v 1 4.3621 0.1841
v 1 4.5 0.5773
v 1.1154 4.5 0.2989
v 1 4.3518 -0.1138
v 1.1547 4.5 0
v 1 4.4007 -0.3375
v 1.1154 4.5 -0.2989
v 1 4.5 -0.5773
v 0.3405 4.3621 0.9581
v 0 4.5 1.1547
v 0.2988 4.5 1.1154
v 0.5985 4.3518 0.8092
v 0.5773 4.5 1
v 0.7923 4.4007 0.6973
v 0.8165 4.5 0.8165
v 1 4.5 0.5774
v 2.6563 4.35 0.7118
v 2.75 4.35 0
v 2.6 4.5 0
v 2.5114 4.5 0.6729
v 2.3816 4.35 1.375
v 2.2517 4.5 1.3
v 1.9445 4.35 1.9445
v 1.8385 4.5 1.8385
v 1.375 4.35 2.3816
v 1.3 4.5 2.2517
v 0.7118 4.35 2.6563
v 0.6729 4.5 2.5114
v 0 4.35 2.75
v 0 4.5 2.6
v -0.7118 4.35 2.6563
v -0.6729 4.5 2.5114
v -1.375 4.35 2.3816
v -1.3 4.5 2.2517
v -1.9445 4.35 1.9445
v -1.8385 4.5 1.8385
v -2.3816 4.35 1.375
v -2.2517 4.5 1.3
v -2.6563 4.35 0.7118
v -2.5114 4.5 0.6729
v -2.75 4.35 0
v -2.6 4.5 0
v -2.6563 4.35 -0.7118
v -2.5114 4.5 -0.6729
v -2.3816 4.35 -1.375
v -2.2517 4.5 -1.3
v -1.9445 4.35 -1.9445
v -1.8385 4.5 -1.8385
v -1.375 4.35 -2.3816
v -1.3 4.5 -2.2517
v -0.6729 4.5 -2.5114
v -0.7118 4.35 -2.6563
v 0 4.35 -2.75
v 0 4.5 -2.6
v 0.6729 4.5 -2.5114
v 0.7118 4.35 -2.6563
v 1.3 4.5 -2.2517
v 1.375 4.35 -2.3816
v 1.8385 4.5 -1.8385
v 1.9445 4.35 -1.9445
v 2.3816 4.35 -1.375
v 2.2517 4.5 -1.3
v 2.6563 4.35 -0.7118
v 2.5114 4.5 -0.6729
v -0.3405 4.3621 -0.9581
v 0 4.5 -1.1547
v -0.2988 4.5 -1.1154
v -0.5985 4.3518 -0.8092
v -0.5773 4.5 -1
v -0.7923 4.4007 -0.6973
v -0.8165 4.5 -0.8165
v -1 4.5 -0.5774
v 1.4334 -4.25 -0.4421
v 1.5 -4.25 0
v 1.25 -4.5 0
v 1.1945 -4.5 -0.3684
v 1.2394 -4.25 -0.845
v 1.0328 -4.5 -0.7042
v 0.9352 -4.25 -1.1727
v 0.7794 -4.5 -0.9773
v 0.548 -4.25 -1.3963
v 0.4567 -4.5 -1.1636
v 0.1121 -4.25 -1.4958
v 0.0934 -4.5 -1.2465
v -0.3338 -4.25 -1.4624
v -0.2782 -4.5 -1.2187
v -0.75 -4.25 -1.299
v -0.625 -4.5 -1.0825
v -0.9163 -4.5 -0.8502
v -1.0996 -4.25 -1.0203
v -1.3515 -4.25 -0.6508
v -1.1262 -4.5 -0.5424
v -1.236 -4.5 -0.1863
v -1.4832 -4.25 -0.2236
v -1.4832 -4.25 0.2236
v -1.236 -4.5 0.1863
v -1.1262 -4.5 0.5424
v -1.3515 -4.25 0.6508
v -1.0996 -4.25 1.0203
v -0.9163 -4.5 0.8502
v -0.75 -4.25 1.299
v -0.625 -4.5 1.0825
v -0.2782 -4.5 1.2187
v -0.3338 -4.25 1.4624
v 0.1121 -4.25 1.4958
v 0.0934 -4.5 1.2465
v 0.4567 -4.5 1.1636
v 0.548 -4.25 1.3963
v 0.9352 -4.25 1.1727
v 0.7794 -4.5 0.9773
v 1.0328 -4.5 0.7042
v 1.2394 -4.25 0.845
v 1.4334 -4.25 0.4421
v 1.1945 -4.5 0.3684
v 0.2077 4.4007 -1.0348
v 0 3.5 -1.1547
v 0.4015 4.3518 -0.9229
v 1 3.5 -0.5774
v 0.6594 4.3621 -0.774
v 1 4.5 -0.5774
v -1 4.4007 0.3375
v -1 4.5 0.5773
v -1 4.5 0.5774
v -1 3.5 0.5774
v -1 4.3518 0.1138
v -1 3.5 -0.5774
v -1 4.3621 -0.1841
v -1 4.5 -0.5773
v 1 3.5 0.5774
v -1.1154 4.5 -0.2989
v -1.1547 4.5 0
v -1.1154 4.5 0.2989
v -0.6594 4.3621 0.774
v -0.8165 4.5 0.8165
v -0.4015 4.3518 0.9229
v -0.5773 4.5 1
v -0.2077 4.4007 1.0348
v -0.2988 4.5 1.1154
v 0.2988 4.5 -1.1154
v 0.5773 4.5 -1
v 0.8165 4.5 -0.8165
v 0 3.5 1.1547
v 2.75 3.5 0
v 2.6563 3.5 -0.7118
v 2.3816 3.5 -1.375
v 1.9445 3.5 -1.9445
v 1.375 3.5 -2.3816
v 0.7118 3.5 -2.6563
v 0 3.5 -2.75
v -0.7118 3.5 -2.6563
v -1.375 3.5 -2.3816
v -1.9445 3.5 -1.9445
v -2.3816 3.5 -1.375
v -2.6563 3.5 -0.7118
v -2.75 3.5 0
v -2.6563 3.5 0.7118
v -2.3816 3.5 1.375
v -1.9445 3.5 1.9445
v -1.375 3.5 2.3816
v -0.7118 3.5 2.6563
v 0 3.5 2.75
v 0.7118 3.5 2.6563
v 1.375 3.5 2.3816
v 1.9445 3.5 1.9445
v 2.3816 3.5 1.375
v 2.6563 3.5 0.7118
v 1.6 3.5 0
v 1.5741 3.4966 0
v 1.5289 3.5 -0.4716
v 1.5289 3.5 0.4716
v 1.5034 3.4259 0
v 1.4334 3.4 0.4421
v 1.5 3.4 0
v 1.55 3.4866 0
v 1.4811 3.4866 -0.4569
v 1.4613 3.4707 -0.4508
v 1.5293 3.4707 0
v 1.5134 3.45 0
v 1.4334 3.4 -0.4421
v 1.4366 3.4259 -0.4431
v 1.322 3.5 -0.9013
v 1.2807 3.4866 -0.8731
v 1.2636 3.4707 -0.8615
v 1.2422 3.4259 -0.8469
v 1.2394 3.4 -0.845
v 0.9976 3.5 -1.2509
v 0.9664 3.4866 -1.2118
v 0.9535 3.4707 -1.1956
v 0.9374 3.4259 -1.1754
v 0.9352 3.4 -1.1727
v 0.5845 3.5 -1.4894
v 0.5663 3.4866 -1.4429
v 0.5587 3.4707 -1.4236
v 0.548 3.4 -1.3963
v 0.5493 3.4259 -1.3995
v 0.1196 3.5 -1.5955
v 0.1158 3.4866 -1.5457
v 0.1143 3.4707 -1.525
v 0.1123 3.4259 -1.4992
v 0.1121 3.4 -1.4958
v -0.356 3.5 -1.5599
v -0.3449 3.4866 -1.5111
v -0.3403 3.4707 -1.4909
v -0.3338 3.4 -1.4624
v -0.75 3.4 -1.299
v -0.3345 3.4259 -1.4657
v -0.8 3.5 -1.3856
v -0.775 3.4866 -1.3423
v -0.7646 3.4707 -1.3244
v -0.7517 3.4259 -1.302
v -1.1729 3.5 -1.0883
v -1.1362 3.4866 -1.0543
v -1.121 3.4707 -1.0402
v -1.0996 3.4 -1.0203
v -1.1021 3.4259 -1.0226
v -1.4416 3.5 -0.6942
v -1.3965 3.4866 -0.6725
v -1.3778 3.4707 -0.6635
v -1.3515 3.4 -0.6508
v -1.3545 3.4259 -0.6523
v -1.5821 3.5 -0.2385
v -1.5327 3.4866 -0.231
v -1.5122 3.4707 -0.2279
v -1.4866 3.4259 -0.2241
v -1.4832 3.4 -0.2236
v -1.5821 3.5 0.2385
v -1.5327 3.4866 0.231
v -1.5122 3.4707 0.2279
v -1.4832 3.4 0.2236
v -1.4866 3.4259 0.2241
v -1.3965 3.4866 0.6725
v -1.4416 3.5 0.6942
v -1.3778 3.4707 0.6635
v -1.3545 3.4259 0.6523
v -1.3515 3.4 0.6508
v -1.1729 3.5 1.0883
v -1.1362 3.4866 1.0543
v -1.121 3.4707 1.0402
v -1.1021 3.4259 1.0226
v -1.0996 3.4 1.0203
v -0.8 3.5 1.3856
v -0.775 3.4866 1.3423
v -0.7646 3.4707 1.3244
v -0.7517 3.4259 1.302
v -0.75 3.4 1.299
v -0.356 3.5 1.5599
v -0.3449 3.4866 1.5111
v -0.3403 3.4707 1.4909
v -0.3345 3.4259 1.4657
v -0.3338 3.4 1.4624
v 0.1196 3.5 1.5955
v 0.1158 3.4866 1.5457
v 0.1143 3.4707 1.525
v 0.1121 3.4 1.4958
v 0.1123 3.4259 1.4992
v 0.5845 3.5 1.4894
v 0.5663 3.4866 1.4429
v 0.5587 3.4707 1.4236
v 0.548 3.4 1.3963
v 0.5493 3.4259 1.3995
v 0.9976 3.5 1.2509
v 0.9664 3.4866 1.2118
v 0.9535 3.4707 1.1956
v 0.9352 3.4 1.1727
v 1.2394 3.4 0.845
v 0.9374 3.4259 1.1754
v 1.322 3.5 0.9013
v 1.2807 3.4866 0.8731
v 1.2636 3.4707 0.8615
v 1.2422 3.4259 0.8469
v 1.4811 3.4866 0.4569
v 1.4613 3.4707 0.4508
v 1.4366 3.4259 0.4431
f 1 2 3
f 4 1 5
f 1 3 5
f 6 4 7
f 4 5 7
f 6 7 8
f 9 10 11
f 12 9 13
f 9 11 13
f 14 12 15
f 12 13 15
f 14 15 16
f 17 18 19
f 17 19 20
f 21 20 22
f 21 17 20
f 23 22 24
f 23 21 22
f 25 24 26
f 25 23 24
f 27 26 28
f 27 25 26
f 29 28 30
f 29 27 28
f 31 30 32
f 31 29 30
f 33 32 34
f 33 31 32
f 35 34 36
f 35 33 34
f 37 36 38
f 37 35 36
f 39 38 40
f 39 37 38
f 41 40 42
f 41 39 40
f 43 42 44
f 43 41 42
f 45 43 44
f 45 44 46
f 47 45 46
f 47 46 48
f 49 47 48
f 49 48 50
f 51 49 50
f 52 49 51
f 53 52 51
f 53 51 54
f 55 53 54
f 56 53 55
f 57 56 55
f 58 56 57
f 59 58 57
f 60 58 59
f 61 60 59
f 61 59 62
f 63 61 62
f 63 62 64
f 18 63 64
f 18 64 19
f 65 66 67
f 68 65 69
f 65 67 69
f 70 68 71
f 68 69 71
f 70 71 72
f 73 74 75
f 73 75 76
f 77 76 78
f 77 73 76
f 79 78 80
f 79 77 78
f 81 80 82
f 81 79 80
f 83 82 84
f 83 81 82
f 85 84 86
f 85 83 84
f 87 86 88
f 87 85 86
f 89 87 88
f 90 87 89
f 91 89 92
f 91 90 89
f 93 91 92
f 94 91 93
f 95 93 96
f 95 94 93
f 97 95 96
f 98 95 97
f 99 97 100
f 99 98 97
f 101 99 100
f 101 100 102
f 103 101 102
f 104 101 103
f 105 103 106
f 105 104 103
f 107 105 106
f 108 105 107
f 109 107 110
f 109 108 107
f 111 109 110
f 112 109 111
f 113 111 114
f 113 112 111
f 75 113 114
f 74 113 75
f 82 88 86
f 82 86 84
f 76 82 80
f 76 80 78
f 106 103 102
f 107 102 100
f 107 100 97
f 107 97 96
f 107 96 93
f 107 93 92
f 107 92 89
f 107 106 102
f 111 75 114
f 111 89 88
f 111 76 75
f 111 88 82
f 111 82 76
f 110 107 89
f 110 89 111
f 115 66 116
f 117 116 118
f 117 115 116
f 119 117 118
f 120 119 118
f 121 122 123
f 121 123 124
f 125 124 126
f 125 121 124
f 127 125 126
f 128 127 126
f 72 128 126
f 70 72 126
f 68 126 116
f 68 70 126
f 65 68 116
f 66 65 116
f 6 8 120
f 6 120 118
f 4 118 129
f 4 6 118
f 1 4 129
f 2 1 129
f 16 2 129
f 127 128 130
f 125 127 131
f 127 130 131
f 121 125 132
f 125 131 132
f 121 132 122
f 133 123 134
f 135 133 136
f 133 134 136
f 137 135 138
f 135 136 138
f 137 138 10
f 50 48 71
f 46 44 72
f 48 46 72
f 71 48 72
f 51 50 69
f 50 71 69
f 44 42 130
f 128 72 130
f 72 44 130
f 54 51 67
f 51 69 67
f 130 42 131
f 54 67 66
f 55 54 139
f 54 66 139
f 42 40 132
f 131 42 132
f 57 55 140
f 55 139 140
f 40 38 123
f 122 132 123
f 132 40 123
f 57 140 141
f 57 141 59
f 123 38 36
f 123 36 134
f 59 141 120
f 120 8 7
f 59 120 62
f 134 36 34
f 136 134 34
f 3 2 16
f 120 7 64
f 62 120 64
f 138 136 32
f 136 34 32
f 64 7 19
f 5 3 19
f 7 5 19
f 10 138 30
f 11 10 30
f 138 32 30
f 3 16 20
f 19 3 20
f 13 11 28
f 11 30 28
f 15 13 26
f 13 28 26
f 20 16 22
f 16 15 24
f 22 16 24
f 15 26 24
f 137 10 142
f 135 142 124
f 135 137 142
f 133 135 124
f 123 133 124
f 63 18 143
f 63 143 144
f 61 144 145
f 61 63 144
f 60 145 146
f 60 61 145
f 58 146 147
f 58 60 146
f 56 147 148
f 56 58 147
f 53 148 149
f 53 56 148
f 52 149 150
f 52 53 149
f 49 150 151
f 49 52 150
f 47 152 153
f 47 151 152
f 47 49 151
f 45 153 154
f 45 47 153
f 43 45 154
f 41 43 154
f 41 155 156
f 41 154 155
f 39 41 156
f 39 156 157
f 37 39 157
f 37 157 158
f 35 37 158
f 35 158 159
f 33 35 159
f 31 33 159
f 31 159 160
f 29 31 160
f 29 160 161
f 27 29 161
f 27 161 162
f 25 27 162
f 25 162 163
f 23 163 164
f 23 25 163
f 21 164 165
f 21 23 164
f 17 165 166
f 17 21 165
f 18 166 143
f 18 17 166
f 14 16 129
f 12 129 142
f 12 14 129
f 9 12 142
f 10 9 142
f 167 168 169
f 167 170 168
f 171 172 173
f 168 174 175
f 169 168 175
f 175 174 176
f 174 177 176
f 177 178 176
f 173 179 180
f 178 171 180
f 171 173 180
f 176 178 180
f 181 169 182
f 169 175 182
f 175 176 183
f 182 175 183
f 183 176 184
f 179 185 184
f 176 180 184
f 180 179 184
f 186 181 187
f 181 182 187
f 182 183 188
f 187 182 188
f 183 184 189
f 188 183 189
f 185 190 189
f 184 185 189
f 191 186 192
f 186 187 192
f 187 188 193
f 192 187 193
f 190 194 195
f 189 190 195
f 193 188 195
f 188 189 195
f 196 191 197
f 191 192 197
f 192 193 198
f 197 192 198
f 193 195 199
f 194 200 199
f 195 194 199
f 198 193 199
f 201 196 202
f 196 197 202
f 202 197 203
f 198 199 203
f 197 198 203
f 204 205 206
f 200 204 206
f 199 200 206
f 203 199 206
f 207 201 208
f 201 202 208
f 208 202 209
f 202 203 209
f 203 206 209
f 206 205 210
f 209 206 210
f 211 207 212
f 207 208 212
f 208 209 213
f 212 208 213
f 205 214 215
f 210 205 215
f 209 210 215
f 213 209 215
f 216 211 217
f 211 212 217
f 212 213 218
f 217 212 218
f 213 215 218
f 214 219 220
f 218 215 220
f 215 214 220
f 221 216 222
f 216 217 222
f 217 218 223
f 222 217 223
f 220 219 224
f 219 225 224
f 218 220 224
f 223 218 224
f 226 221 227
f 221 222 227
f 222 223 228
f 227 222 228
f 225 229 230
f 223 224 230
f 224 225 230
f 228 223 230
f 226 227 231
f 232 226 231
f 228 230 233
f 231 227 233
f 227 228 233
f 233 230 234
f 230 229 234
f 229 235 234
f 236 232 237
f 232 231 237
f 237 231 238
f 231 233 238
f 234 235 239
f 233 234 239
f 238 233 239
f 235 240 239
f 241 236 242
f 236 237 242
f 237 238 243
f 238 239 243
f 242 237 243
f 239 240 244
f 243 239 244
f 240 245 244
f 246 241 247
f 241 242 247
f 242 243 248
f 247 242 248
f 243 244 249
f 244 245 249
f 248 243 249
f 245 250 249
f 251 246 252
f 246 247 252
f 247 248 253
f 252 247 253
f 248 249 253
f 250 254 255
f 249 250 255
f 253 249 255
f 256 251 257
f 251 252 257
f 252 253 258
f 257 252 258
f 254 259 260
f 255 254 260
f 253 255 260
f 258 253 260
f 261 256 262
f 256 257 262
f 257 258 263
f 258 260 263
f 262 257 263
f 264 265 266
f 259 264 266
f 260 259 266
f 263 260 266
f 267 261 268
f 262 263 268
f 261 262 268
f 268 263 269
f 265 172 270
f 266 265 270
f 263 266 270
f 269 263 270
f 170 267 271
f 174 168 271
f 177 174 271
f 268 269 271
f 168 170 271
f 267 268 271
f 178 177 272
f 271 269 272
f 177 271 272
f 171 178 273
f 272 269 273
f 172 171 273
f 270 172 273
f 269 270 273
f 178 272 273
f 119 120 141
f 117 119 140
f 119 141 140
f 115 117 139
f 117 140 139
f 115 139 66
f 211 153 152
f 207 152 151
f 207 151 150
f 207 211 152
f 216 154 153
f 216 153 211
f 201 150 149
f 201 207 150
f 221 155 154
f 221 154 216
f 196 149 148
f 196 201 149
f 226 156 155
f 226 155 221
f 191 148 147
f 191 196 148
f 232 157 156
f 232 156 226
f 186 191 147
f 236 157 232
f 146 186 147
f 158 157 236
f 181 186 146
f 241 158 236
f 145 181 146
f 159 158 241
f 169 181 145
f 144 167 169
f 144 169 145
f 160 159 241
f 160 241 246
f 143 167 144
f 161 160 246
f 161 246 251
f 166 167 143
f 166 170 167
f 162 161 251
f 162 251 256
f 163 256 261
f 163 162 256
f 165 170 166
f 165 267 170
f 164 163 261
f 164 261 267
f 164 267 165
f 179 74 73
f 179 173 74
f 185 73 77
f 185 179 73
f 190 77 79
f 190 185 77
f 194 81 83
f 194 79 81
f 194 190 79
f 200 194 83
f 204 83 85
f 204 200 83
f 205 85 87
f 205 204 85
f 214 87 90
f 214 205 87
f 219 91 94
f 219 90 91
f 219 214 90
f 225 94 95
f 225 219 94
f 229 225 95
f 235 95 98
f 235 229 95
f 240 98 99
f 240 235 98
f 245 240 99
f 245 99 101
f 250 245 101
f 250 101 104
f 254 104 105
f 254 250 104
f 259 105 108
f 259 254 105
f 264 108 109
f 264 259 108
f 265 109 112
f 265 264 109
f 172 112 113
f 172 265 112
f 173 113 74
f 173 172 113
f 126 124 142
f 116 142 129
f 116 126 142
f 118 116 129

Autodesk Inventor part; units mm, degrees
ref_plane "YZ Plane" through (0, 0, 0) normal (1, 0, 0) x (0, 1, 0)
ref_plane "XZ Plane" through (0, 0, 0) normal (0, 1, 0) x (-1, 0, 0)
ref_plane "XY Plane" through (0, 0, 0) normal (0, 0, 1) x (1, 0, 0)
sketch "Sketch1" plane through (0, 0, 0) normal (0, 0, 1) x (1, 0, 0)
  line L0 (0, 4.5) -> (0, -4.5)
  line L1 (0, -4.5) -> (1.25, -4.5)
  line L2 (1.25, -4.5) -> (1.5, -4.25)
  line L3 (1.5, -4.25) -> (1.5, 3.4)
  line L4 (1.6, 3.5) -> (2.75, 3.5)
  line L5 (2.75, 3.5) -> (2.75, 4.35)
  line L6 (2.6, 4.5) -> (0, 4.5)
  arc A0 (1.6, 3.5) -> (1.5, 3.4) centre (1.6, 3.4) ccw
  line L7 (2.6, 4.5) -> (2.75, 4.35)
  point P0 (0, 0)
  point P1 (2.75, 4.5)
  point P2 (0, 0)
  dimension "d0" = 5.5
  dimension "d1" = 1
  dimension "d3" = 3
  dimension "d4" = 3.2
  dimension "d5" = 135
  dimension "d6" = 0.25
  dimension "d7" = 8
  dimension "d18" = 0.15
  dimension "d22" = 0.15
revolve "Revolution1" add sketch "Sketch1" angle 360 about axis through (0, 4.5, 0) along (0, -1, 0)
sketch "Sketch2" plane through (0, 4.5, 0) normal (0, 1, 0) x (1, 0, 0)
  line L0 (0, -1.1547) -> (-1, -0.5774)
  line L1 (-1, -0.5774) -> (-1, 0.5774)
  line L2 (-1, 0.5774) -> (0, 1.1547)
  line L3 (0, 1.1547) -> (1, 0.5774)
  line L4 (1, 0.5774) -> (1, -0.5774)
  line L5 (1, -0.5774) -> (0, -1.1547)
  point P0 (0, 0)
  point P1 (0, 0)
  dimension "d11" = 2
extrude "Extrusion1" cut sketch "Sketch2" against normal blind 1
thread "Thread1" size "M3x0.5" class "6g" standard "ANSI Metric M Profile" full length
sketch "Sketch3" plane through (0, 0, 0) normal (1, 0, 0) x (0, 1, 0)
  line L0 (4.5, 1.1547) -> (4.5, 0.5774) projected
  line L1 (4.5, 1.1547) -> (4, 0.6547)
  line L2 (4, 0.6547) -> (4.5, 0.6547)
  line L3 (4.5, 0.6547) -> (4.5, 1.1547)
  line L4 (-0.9, 0) -> (5.4, 0) projected
  point P0 (0, 0)
  dimension "d16" = 0.5
revolve "Revolution2" cut sketch "Sketch3" angle 360 about axis through (0, -10, 0) along (0, 1, 0)
equation "\"d22\" = d18"
properties part number "Bolt_M3x0.35_6mm_SH" material "Stainless Steel"
